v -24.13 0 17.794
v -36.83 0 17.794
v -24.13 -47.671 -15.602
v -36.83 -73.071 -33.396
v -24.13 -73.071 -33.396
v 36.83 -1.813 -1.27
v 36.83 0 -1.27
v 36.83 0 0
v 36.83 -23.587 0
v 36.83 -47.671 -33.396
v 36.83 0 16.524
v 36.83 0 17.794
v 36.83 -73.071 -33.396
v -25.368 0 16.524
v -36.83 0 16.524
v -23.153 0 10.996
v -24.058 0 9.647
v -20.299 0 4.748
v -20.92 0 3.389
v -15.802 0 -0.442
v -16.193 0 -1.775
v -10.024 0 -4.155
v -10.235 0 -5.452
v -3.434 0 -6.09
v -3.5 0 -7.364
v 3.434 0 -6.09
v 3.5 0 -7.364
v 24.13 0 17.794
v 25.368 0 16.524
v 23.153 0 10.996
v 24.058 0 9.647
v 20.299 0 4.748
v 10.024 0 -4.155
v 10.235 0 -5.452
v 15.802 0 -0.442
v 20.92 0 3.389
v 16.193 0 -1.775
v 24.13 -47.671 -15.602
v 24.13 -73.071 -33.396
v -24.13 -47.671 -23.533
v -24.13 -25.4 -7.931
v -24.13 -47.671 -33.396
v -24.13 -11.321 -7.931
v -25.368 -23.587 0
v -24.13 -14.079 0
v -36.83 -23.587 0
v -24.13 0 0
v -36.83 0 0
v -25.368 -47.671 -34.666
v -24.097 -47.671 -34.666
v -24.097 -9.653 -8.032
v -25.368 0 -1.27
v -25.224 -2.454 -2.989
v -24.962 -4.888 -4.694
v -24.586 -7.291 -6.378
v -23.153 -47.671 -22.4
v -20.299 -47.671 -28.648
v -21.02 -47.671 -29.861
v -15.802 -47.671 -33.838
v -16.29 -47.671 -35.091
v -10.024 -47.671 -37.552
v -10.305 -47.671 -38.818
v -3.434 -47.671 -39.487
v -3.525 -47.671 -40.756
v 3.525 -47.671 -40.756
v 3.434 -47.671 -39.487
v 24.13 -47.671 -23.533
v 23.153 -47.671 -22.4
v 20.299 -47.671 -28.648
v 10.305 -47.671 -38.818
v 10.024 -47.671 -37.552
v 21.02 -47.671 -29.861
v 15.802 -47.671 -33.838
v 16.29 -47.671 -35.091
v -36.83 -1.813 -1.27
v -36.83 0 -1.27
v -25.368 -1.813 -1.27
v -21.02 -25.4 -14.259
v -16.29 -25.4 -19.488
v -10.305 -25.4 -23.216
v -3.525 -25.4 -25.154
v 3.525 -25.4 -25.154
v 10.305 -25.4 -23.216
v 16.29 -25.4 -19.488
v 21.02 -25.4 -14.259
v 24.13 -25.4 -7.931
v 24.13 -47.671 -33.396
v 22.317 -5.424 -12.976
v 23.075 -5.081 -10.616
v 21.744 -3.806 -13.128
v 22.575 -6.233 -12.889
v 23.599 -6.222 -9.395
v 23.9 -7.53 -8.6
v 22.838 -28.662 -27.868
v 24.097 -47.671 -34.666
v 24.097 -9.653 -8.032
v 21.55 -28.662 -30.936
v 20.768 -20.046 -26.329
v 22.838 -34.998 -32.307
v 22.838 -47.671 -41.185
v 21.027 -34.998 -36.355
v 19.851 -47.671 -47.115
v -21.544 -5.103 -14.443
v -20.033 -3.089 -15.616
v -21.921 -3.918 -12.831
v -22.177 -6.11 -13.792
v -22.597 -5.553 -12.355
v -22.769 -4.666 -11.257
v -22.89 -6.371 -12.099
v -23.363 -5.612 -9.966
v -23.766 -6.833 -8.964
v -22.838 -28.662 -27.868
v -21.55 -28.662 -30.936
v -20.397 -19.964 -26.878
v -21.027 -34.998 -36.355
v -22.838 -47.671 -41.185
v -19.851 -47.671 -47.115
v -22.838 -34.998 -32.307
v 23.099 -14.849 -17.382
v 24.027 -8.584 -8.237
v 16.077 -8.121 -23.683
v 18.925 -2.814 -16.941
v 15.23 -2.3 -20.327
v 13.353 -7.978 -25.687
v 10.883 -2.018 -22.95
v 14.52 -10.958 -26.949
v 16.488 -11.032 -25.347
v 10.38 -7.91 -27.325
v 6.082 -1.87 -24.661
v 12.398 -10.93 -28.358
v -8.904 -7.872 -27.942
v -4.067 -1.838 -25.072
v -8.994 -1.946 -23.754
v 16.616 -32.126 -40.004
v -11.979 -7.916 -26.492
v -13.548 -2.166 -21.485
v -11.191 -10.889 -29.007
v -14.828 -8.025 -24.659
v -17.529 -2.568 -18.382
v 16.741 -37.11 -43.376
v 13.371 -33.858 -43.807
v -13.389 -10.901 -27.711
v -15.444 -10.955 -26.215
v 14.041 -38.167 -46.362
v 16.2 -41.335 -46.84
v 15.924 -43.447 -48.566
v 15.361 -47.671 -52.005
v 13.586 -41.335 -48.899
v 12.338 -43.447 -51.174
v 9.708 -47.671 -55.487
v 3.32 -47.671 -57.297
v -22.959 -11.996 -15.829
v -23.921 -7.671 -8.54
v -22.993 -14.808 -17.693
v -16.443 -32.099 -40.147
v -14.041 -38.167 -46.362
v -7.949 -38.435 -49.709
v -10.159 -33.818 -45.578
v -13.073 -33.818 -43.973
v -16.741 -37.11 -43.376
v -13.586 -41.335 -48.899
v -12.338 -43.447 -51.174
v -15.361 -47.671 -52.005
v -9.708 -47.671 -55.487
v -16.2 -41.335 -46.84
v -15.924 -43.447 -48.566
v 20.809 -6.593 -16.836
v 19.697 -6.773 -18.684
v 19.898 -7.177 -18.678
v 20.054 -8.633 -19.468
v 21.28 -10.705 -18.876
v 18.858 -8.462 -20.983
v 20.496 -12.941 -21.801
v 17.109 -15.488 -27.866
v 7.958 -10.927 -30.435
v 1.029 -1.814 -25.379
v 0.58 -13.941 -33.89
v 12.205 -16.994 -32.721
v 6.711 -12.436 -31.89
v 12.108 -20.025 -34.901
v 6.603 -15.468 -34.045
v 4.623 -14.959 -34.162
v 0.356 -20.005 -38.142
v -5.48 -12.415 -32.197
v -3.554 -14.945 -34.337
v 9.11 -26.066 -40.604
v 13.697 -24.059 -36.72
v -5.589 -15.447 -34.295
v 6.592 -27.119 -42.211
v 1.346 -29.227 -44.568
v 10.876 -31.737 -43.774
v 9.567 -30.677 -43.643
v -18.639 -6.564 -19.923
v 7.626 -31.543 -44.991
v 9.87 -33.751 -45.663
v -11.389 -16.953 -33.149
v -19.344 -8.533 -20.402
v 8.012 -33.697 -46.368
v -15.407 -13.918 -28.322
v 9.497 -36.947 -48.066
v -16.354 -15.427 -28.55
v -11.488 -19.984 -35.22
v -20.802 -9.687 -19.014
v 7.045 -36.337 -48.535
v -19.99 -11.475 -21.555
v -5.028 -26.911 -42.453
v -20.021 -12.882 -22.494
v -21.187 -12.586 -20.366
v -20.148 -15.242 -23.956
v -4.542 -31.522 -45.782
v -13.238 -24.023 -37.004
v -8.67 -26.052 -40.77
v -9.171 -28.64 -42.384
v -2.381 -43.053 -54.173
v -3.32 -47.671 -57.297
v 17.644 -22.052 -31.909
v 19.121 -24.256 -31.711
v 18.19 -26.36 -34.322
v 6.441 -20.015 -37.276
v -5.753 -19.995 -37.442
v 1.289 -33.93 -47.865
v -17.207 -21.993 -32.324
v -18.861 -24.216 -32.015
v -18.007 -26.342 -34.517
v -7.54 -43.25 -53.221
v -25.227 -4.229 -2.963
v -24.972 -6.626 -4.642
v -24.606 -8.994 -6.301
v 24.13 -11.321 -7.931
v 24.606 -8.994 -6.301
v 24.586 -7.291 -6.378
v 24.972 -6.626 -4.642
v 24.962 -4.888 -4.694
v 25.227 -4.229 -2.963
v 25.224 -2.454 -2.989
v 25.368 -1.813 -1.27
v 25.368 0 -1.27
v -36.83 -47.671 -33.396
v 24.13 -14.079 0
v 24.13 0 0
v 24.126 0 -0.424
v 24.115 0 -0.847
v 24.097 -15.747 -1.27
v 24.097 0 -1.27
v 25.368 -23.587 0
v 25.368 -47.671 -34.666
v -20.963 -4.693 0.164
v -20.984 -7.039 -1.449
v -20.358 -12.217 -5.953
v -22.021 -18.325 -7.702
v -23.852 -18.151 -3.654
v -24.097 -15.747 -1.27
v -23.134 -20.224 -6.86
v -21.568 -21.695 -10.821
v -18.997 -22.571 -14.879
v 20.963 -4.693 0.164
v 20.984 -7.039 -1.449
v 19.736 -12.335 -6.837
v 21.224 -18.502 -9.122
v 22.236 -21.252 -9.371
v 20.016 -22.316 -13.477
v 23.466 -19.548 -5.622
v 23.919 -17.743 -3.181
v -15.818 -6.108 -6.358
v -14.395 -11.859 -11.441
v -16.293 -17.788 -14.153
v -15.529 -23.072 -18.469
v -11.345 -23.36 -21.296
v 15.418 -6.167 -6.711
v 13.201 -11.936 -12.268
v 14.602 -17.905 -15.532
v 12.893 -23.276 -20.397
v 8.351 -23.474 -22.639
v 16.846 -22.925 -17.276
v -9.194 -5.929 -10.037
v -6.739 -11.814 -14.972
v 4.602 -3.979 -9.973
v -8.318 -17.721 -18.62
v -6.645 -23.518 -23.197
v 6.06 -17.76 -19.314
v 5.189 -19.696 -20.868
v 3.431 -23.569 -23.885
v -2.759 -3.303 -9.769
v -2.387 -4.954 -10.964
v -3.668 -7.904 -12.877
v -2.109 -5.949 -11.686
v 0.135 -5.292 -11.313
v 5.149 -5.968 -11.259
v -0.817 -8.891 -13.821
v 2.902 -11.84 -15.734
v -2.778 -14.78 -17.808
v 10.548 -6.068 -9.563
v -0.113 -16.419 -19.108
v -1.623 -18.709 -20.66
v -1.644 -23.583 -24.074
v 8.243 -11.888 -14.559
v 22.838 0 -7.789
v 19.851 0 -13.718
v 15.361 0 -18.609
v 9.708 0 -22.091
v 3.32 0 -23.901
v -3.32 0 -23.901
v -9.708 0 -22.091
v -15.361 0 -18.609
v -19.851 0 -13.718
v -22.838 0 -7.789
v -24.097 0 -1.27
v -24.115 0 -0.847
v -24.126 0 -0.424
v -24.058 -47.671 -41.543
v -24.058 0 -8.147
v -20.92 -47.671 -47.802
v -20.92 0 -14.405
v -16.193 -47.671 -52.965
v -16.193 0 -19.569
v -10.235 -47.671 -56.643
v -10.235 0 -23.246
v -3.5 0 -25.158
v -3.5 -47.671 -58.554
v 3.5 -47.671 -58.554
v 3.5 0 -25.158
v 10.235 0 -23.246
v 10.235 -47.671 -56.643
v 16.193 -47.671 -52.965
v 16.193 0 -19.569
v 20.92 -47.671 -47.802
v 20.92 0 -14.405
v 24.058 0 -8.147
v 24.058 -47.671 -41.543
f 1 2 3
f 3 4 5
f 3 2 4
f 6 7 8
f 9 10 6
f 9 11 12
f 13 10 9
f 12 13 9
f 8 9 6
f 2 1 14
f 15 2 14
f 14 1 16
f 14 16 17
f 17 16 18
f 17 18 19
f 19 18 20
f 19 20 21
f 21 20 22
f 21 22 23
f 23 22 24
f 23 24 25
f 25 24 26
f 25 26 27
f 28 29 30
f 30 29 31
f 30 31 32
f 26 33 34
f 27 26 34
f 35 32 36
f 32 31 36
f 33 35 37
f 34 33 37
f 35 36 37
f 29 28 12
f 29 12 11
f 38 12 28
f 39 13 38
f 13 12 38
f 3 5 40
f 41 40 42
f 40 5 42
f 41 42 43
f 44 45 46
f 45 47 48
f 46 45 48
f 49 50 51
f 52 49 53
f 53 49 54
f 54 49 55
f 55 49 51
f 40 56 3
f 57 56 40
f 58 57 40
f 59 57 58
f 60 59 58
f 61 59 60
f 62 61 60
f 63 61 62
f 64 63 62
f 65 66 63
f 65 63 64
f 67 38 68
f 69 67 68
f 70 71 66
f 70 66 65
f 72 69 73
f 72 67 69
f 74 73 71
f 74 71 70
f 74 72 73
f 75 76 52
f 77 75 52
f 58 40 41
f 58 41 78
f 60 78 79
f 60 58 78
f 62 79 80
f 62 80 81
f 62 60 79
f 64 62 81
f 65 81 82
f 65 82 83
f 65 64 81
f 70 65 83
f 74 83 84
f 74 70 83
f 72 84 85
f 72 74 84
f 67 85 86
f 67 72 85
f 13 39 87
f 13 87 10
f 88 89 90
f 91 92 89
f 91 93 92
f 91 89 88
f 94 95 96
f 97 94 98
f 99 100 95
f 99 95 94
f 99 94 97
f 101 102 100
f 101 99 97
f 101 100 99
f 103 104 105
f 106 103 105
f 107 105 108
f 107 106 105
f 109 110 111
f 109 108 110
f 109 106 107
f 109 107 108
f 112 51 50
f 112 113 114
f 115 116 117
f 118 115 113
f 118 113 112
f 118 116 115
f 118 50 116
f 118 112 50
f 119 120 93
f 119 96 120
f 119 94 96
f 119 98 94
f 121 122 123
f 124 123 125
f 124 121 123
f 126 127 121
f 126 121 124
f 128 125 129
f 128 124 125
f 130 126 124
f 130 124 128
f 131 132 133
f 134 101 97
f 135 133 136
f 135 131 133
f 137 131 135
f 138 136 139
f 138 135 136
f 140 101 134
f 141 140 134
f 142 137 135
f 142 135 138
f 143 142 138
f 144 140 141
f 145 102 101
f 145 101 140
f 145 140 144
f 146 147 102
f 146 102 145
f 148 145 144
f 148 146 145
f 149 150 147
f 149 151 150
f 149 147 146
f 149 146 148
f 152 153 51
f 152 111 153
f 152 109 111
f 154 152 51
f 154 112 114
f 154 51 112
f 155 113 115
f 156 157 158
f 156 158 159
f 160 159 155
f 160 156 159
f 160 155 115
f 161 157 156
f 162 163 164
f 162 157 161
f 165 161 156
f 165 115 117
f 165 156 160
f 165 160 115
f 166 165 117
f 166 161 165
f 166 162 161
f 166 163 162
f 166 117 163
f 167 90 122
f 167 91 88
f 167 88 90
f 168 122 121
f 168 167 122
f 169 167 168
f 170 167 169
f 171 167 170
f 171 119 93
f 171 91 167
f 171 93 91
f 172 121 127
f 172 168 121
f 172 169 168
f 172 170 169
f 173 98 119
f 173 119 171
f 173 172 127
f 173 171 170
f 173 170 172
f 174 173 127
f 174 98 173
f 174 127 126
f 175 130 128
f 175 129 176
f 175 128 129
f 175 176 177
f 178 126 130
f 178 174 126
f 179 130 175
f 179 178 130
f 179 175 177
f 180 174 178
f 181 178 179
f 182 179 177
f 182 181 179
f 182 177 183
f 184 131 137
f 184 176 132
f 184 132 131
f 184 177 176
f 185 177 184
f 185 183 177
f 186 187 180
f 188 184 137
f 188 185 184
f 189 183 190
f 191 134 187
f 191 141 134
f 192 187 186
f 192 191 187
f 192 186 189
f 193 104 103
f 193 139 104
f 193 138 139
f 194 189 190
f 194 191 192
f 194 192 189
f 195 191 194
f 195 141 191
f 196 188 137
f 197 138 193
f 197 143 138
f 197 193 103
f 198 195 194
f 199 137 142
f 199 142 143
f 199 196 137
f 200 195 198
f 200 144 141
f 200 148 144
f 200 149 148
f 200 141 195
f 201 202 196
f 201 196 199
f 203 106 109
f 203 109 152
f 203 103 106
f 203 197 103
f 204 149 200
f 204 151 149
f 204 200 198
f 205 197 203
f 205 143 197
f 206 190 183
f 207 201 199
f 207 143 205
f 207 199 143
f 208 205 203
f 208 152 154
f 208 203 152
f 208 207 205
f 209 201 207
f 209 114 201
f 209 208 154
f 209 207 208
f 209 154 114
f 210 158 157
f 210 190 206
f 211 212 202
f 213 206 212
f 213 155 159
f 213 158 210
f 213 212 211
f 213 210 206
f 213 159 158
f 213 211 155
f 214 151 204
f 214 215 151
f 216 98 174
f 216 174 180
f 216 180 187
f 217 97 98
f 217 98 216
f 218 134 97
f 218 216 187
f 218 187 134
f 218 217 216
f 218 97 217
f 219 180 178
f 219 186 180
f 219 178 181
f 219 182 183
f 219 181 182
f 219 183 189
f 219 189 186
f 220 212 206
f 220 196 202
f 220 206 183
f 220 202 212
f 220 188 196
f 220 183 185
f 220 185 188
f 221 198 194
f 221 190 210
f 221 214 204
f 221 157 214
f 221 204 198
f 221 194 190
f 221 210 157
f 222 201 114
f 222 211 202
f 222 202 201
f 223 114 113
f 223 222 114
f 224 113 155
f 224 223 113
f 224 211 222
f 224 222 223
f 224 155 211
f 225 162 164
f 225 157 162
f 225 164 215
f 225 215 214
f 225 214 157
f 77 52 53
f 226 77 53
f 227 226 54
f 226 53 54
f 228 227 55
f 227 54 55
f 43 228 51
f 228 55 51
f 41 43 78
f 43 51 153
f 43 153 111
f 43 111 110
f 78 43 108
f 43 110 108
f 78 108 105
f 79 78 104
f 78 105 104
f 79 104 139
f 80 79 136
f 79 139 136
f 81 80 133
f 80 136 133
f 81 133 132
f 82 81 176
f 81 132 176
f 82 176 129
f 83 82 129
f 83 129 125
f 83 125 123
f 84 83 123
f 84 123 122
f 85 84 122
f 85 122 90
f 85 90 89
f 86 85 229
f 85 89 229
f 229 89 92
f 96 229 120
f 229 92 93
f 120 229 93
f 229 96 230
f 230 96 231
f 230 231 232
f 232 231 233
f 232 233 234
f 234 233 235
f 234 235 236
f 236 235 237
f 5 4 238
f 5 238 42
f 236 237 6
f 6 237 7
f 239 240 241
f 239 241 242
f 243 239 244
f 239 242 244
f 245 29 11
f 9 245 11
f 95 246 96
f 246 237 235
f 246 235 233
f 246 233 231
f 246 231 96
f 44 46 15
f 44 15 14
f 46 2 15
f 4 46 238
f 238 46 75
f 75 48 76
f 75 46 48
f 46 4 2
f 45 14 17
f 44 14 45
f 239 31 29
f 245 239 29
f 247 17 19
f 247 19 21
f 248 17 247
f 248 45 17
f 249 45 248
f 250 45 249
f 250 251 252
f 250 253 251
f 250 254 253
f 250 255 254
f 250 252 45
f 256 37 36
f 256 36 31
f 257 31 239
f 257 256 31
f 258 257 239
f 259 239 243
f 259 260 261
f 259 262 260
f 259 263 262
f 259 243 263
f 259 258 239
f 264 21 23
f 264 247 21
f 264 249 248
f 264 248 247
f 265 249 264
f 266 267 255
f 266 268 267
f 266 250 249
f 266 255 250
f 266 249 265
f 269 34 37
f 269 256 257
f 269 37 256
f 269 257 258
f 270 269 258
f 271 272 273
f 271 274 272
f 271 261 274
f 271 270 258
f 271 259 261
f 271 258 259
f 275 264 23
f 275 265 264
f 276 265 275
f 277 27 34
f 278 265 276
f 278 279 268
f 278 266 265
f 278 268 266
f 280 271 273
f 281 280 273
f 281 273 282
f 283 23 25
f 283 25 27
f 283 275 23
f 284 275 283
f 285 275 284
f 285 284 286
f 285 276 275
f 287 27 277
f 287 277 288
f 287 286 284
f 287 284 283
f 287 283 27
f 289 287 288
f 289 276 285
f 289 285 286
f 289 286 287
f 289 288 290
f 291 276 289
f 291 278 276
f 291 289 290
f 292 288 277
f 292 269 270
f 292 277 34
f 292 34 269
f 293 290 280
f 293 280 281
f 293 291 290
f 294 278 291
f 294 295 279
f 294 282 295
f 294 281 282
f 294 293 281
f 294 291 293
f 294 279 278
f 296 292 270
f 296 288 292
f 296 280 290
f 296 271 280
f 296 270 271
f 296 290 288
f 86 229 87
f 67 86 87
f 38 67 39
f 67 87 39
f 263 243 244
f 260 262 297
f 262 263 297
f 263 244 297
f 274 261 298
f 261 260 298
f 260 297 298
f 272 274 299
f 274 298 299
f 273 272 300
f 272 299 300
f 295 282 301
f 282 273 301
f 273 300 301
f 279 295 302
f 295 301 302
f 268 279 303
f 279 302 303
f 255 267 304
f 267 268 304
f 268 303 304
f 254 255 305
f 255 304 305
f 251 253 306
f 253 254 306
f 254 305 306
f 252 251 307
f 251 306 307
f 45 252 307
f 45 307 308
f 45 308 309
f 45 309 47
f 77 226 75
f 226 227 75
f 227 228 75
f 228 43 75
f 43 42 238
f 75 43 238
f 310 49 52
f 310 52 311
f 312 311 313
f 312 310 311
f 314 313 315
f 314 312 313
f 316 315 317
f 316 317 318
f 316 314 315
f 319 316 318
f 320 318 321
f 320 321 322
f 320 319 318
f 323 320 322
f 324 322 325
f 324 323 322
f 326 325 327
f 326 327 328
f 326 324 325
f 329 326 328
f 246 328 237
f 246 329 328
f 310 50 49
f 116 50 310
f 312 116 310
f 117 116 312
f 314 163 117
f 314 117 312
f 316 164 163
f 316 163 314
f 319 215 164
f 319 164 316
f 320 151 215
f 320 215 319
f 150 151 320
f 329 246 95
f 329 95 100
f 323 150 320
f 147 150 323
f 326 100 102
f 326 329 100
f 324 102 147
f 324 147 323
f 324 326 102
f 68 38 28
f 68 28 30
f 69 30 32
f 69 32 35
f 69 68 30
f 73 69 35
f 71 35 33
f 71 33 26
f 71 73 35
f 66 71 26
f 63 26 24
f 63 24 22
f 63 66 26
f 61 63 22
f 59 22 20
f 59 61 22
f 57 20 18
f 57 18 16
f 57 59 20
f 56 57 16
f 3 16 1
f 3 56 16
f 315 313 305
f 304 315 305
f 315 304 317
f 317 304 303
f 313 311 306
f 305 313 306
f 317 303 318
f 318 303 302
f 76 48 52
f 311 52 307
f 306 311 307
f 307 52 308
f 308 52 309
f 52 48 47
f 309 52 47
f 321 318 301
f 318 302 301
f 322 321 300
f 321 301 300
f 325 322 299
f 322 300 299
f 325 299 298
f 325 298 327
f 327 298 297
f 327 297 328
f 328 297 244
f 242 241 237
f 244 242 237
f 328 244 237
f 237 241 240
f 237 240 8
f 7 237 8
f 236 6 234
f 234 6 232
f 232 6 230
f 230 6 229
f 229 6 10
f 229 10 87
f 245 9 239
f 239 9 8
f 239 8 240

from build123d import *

# Parameters (mm, degrees)
F1_DEPTH  = 25.4
F1_FACE_W = 12.7
F1_FACE_H = 25.4


with BuildPart() as f1:
    # F0 (on Front) → F1 (new body)
    with BuildSketch(Plane.XZ):
        with BuildLine():
            Line((-24.13, 0), (-25.4, 0))
            ThreePointArc((-25.4, 0), (-25.3920562907, -0.6351986549), (-25.3682301314, -1.27))
            Line((-25.3682301314, -1.27), (-24.0965557705, -1.27))
            ThreePointArc((-24.0965557705, -1.27), (-24.1216374936, -0.6352201423), (-24.13, 0))
        make_face()
        with BuildLine():
            ThreePointArc((-25.3682301314, -1.27), (-25.3920562907, -0.6351986549), (-25.4, 0))
            Line((-25.4, 0), (-36.83, 0))
            Line((-36.83, 0), (-36.83, -1.27))
            Line((-36.83, -1.27), (-25.3682301314, -1.27))
        make_face()
        with BuildLine():
            Line((-24.0965557705, -1.27), (-25.3682301314, -1.27))
            ThreePointArc((-25.3682301314, -1.27), (0, -25.4), (25.3682301314, -1.27))
            Line((25.3682301314, -1.27), (24.0965557705, -1.27))
            ThreePointArc((24.0965557705, -1.27), (0, -24.13), (-24.0965557705, -1.27))
        make_face()
        with BuildLine():
            Line((24.0965557705, -1.27), (25.3682301314, -1.27))
            ThreePointArc((25.3682301314, -1.27), (25.3920562907, -0.6351986549), (25.4, 0))
            Line((25.4, 0), (24.13, 0))
            ThreePointArc((24.13, 0), (24.1216374936, -0.6352201423), (24.0965557705, -1.27))
        make_face()
        with BuildLine():
            ThreePointArc((25.4, 0), (25.3920562907, -0.6351986549), (25.3682301314, -1.27))
            Line((25.3682301314, -1.27), (36.83, -1.27))
            Line((36.83, -1.27), (36.83, 0))
            Line((36.83, 0), (25.4, 0))
        make_face()
    extrude(amount=F1_DEPTH)

    # F3: sweep along a path in F2
    with BuildLine(Plane.YZ) as f3_path:
        Line((0, 0), (-47.6711578667, -33.3962440491))
    # F1_face (on face) + F1_face1 (on face) + F0 (on Front) → F3 (sweep)
    with BuildSketch(Plane(origin=(-30.48, -12.7, 0), x_dir=(1, 0, 0), z_dir=(0, 0, 1))):
        Rectangle(F1_FACE_W, F1_FACE_H)
        with Locations((60.96, 0)):
            Rectangle(F1_FACE_W, F1_FACE_H)
    with BuildSketch(Plane(origin=(1e-10, -25.4, -12.329976557), x_dir=(1, 0, 0), z_dir=(0, -1, 0))):
        with BuildLine():
            Line((-24.1300000001, 12.329976557), (-36.8300000001, 12.329976557))
            Line((-36.8300000001, 12.329976557), (-36.8300000001, 11.059976557))
            Line((-36.8300000001, 11.059976557), (-25.3682301315, 11.059976557))
            ThreePointArc((-25.3682301315, 11.059976557), (-1e-10, -13.070023443), (25.3682301313, 11.059976557))
            Line((25.3682301313, 11.059976557), (36.8299999999, 11.059976557))
            Line((36.8299999999, 11.059976557), (36.8299999999, 12.329976557))
            Line((36.8299999999, 12.329976557), (24.1299999999, 12.329976557))
            ThreePointArc((24.1299999999, 12.329976557), (-1e-10, -11.8000234431), (-24.1300000001, 12.329976557))
        make_face()
    with BuildSketch(Plane.XZ):
        with BuildLine():
            Line((-24.0965557705, -1.27), (-25.3682301314, -1.27))
            ThreePointArc((-25.3682301314, -1.27), (0, -25.4), (25.3682301314, -1.27))
            Line((25.3682301314, -1.27), (24.0965557705, -1.27))
            ThreePointArc((24.0965557705, -1.27), (0, -24.13), (-24.0965557705, -1.27))
        make_face()
    sweep(path=f3_path.line)


solid = f1.part
